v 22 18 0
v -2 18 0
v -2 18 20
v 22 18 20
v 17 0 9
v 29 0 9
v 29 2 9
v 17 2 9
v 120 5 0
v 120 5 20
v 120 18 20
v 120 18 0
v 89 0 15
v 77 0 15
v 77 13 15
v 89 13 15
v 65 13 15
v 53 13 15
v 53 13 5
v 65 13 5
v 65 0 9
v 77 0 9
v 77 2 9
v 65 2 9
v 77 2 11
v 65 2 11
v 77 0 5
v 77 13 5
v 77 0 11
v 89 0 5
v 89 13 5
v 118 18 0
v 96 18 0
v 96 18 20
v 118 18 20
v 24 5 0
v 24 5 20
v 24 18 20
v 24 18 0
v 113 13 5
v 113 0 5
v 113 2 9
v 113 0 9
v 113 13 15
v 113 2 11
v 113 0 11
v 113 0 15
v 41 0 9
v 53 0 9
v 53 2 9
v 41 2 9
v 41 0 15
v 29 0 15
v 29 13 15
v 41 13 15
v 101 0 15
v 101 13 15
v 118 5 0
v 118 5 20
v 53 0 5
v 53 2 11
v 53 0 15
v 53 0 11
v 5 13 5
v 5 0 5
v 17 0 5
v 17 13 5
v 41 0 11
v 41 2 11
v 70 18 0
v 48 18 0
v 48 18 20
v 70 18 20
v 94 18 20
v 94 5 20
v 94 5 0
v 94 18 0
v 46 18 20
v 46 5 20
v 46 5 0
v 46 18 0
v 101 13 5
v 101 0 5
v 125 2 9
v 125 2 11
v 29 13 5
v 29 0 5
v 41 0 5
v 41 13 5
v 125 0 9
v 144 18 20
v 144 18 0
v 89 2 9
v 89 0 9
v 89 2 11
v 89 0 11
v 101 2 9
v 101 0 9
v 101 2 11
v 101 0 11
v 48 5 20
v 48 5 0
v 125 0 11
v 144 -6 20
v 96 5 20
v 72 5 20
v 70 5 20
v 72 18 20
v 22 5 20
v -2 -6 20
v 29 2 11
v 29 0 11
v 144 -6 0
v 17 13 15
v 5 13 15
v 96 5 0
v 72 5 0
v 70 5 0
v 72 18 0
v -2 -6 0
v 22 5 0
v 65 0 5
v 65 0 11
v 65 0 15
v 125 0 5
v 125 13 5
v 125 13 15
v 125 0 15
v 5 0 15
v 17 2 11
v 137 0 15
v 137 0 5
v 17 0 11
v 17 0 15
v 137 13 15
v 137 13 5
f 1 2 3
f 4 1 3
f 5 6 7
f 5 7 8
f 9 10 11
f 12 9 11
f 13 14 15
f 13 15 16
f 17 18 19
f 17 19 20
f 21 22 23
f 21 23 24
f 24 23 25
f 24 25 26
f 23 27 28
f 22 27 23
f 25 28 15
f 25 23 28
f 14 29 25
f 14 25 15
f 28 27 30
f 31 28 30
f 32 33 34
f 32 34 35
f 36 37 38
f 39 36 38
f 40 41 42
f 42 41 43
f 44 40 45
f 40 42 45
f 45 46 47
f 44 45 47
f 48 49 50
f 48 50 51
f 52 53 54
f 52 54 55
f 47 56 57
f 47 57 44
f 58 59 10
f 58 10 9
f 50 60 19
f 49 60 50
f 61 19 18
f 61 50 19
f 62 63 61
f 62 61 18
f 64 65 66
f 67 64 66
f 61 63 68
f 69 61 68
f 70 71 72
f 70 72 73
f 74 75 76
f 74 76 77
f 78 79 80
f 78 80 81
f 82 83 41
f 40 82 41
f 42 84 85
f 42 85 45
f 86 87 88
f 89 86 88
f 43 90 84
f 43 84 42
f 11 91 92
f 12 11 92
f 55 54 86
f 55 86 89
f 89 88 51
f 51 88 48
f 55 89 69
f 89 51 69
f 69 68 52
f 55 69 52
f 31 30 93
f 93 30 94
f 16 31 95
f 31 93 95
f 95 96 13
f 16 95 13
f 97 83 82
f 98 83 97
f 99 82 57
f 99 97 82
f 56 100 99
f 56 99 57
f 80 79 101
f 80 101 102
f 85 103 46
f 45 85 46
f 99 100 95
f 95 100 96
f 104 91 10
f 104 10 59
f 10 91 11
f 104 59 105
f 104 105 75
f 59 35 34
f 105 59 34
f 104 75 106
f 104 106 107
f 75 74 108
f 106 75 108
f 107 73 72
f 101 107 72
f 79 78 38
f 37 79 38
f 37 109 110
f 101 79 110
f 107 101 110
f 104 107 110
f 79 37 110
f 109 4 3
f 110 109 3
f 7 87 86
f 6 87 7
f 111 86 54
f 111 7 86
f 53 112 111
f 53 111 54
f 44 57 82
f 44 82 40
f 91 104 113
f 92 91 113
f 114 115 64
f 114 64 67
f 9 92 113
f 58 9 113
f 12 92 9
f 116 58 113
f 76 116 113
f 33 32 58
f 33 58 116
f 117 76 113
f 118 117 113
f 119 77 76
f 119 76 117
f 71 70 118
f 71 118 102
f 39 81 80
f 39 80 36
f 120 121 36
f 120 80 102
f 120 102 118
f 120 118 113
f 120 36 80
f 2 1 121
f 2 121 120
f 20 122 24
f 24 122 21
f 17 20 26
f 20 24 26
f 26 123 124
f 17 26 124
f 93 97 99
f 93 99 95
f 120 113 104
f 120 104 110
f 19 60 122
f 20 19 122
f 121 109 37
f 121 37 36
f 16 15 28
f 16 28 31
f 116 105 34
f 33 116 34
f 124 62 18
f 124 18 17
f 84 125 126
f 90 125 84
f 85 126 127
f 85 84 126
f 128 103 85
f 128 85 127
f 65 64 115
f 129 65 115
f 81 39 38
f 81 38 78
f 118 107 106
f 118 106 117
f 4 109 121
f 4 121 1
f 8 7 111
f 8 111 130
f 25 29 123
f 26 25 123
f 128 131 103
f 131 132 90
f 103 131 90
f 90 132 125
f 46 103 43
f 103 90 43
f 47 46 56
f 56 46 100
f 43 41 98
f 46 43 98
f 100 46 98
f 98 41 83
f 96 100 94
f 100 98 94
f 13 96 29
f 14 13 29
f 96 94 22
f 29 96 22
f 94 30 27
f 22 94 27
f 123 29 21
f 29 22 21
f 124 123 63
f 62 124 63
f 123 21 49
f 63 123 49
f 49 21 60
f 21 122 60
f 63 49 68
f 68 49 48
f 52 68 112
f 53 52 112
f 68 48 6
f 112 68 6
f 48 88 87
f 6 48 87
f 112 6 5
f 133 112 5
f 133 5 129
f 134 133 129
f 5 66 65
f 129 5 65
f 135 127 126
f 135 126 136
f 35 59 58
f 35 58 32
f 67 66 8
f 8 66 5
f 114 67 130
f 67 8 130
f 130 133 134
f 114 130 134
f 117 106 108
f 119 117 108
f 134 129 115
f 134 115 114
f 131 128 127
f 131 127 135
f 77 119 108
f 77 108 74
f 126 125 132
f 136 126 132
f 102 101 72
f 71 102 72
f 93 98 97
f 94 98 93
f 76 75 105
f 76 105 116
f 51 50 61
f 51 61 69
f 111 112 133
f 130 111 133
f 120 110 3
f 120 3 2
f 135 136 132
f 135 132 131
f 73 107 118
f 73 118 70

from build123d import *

# Parameters (mm, degrees)
SKETCH1_W           = 22
SKETCH1_H           = 18
BOSS_EXTRUDE1_DEPTH = 20
SKETCH2_W           = 12
SKETCH2_H           = 10
CUT_EXTRUDE1_DEPTH  = 13
SKETCH3_W           = 20
SKETCH3_H           = 5
BOSS_EXTRUDE2_DEPTH = 2
LPATTERN1_COUNT     = 6
LPATTERN1_PITCH     = 24
SKETCH4_W           = 20
SKETCH4_H           = 13
BOSS_EXTRUDE3_DEPTH = 2
SKETCH5_W           = 20
SKETCH5_H           = 18
BOSS_EXTRUDE4_DEPTH = 2
SKETCH6_W           = 132
SKETCH6_H           = 2
CUT_EXTRUDE2_DEPTH  = 2
SKETCH7_W           = 146
SKETCH7_H           = 20
BOSS_EXTRUDE5_DEPTH = 6


with BuildPart() as part:
    # Sketch1 → Boss-Extrude1 (new body)
    with BuildSketch(Plane.XY):
        with Locations((11, 9)):
            Rectangle(SKETCH1_W, SKETCH1_H)
    extrude(amount=BOSS_EXTRUDE1_DEPTH)

    # Sketch2 → Cut-Extrude1 (cut)
    with BuildSketch(Plane.XZ):
        with Locations((11, 10)):
            Rectangle(SKETCH2_W, SKETCH2_H)
    extrude(amount=-CUT_EXTRUDE1_DEPTH, mode=Mode.SUBTRACT)

    # Sketch3 → Boss-Extrude2 (add)
    with BuildSketch(Plane(origin=(22, 0, 0), x_dir=(0, 0, -1), z_dir=(1, 0, 0))):
        with Locations((-10, 2.5)):
            Rectangle(SKETCH3_W, SKETCH3_H)
    extrude(amount=BOSS_EXTRUDE2_DEPTH)


with BuildPart() as lpattern1_1:
    # LPattern1: pattern copy
    add(part.part.moved(Location(Vector(1, 0, 0) * (1 * LPATTERN1_PITCH))))


with BuildPart() as lpattern1_2:
    # LPattern1: pattern copy
    add(part.part.moved(Location(Vector(1, 0, 0) * (2 * LPATTERN1_PITCH))))


with BuildPart() as lpattern1_3:
    # LPattern1: pattern copy
    add(part.part.moved(Location(Vector(1, 0, 0) * (3 * LPATTERN1_PITCH))))


with BuildPart() as lpattern1_4:
    # LPattern1: pattern copy
    add(part.part.moved(Location(Vector(1, 0, 0) * (4 * LPATTERN1_PITCH))))


with BuildPart() as lpattern1_5:
    # LPattern1: pattern copy
    add(part.part.moved(Location(Vector(1, 0, 0) * (5 * LPATTERN1_PITCH))))

    # Sketch4 → Boss-Extrude3 (add)
    with BuildSketch(Plane(origin=(142, 0, 0), x_dir=(0, 0, -1), z_dir=(1, 0, 0))):
        with Locations((-10, 11.5)):
            Rectangle(SKETCH4_W, SKETCH4_H)
    extrude(amount=BOSS_EXTRUDE3_DEPTH)


with BuildPart() as part_1:
    add(part.part)

    # Sketch5 → Boss-Extrude4 (add)
    with BuildSketch(Plane.ZY):
        with Locations((10, 9)):
            Rectangle(SKETCH5_W, SKETCH5_H)
    extrude(amount=BOSS_EXTRUDE4_DEPTH)


with BuildPart() as lpattern1_1_1:
    add(lpattern1_1.part)

    # Combine1: union LPattern1_2, LPattern1_3, LPattern1_4, LPattern1_5, part
    add(lpattern1_2.part)
    add(lpattern1_3.part)
    add(lpattern1_4.part)
    add(lpattern1_5.part)
    add(part_1.part)

    # Sketch6 → Cut-Extrude2 (cut)
    with BuildSketch(Plane(origin=(0, 0, 0), x_dir=(-1, 0, 0), z_dir=(0, -1, 0))):
        with Locations((-71, -10)):
            Rectangle(SKETCH6_W, SKETCH6_H)
    extrude(amount=-CUT_EXTRUDE2_DEPTH, mode=Mode.SUBTRACT)

    # Sketch7 → Boss-Extrude5 (add)
    with BuildSketch(Plane(origin=(0, 0, 0), x_dir=(-1, 0, 0), z_dir=(0, -1, 0))):
        with Locations((-71, -10)):
            Rectangle(SKETCH7_W, SKETCH7_H)
    extrude(amount=BOSS_EXTRUDE5_DEPTH)


solid = lpattern1_1_1.part
